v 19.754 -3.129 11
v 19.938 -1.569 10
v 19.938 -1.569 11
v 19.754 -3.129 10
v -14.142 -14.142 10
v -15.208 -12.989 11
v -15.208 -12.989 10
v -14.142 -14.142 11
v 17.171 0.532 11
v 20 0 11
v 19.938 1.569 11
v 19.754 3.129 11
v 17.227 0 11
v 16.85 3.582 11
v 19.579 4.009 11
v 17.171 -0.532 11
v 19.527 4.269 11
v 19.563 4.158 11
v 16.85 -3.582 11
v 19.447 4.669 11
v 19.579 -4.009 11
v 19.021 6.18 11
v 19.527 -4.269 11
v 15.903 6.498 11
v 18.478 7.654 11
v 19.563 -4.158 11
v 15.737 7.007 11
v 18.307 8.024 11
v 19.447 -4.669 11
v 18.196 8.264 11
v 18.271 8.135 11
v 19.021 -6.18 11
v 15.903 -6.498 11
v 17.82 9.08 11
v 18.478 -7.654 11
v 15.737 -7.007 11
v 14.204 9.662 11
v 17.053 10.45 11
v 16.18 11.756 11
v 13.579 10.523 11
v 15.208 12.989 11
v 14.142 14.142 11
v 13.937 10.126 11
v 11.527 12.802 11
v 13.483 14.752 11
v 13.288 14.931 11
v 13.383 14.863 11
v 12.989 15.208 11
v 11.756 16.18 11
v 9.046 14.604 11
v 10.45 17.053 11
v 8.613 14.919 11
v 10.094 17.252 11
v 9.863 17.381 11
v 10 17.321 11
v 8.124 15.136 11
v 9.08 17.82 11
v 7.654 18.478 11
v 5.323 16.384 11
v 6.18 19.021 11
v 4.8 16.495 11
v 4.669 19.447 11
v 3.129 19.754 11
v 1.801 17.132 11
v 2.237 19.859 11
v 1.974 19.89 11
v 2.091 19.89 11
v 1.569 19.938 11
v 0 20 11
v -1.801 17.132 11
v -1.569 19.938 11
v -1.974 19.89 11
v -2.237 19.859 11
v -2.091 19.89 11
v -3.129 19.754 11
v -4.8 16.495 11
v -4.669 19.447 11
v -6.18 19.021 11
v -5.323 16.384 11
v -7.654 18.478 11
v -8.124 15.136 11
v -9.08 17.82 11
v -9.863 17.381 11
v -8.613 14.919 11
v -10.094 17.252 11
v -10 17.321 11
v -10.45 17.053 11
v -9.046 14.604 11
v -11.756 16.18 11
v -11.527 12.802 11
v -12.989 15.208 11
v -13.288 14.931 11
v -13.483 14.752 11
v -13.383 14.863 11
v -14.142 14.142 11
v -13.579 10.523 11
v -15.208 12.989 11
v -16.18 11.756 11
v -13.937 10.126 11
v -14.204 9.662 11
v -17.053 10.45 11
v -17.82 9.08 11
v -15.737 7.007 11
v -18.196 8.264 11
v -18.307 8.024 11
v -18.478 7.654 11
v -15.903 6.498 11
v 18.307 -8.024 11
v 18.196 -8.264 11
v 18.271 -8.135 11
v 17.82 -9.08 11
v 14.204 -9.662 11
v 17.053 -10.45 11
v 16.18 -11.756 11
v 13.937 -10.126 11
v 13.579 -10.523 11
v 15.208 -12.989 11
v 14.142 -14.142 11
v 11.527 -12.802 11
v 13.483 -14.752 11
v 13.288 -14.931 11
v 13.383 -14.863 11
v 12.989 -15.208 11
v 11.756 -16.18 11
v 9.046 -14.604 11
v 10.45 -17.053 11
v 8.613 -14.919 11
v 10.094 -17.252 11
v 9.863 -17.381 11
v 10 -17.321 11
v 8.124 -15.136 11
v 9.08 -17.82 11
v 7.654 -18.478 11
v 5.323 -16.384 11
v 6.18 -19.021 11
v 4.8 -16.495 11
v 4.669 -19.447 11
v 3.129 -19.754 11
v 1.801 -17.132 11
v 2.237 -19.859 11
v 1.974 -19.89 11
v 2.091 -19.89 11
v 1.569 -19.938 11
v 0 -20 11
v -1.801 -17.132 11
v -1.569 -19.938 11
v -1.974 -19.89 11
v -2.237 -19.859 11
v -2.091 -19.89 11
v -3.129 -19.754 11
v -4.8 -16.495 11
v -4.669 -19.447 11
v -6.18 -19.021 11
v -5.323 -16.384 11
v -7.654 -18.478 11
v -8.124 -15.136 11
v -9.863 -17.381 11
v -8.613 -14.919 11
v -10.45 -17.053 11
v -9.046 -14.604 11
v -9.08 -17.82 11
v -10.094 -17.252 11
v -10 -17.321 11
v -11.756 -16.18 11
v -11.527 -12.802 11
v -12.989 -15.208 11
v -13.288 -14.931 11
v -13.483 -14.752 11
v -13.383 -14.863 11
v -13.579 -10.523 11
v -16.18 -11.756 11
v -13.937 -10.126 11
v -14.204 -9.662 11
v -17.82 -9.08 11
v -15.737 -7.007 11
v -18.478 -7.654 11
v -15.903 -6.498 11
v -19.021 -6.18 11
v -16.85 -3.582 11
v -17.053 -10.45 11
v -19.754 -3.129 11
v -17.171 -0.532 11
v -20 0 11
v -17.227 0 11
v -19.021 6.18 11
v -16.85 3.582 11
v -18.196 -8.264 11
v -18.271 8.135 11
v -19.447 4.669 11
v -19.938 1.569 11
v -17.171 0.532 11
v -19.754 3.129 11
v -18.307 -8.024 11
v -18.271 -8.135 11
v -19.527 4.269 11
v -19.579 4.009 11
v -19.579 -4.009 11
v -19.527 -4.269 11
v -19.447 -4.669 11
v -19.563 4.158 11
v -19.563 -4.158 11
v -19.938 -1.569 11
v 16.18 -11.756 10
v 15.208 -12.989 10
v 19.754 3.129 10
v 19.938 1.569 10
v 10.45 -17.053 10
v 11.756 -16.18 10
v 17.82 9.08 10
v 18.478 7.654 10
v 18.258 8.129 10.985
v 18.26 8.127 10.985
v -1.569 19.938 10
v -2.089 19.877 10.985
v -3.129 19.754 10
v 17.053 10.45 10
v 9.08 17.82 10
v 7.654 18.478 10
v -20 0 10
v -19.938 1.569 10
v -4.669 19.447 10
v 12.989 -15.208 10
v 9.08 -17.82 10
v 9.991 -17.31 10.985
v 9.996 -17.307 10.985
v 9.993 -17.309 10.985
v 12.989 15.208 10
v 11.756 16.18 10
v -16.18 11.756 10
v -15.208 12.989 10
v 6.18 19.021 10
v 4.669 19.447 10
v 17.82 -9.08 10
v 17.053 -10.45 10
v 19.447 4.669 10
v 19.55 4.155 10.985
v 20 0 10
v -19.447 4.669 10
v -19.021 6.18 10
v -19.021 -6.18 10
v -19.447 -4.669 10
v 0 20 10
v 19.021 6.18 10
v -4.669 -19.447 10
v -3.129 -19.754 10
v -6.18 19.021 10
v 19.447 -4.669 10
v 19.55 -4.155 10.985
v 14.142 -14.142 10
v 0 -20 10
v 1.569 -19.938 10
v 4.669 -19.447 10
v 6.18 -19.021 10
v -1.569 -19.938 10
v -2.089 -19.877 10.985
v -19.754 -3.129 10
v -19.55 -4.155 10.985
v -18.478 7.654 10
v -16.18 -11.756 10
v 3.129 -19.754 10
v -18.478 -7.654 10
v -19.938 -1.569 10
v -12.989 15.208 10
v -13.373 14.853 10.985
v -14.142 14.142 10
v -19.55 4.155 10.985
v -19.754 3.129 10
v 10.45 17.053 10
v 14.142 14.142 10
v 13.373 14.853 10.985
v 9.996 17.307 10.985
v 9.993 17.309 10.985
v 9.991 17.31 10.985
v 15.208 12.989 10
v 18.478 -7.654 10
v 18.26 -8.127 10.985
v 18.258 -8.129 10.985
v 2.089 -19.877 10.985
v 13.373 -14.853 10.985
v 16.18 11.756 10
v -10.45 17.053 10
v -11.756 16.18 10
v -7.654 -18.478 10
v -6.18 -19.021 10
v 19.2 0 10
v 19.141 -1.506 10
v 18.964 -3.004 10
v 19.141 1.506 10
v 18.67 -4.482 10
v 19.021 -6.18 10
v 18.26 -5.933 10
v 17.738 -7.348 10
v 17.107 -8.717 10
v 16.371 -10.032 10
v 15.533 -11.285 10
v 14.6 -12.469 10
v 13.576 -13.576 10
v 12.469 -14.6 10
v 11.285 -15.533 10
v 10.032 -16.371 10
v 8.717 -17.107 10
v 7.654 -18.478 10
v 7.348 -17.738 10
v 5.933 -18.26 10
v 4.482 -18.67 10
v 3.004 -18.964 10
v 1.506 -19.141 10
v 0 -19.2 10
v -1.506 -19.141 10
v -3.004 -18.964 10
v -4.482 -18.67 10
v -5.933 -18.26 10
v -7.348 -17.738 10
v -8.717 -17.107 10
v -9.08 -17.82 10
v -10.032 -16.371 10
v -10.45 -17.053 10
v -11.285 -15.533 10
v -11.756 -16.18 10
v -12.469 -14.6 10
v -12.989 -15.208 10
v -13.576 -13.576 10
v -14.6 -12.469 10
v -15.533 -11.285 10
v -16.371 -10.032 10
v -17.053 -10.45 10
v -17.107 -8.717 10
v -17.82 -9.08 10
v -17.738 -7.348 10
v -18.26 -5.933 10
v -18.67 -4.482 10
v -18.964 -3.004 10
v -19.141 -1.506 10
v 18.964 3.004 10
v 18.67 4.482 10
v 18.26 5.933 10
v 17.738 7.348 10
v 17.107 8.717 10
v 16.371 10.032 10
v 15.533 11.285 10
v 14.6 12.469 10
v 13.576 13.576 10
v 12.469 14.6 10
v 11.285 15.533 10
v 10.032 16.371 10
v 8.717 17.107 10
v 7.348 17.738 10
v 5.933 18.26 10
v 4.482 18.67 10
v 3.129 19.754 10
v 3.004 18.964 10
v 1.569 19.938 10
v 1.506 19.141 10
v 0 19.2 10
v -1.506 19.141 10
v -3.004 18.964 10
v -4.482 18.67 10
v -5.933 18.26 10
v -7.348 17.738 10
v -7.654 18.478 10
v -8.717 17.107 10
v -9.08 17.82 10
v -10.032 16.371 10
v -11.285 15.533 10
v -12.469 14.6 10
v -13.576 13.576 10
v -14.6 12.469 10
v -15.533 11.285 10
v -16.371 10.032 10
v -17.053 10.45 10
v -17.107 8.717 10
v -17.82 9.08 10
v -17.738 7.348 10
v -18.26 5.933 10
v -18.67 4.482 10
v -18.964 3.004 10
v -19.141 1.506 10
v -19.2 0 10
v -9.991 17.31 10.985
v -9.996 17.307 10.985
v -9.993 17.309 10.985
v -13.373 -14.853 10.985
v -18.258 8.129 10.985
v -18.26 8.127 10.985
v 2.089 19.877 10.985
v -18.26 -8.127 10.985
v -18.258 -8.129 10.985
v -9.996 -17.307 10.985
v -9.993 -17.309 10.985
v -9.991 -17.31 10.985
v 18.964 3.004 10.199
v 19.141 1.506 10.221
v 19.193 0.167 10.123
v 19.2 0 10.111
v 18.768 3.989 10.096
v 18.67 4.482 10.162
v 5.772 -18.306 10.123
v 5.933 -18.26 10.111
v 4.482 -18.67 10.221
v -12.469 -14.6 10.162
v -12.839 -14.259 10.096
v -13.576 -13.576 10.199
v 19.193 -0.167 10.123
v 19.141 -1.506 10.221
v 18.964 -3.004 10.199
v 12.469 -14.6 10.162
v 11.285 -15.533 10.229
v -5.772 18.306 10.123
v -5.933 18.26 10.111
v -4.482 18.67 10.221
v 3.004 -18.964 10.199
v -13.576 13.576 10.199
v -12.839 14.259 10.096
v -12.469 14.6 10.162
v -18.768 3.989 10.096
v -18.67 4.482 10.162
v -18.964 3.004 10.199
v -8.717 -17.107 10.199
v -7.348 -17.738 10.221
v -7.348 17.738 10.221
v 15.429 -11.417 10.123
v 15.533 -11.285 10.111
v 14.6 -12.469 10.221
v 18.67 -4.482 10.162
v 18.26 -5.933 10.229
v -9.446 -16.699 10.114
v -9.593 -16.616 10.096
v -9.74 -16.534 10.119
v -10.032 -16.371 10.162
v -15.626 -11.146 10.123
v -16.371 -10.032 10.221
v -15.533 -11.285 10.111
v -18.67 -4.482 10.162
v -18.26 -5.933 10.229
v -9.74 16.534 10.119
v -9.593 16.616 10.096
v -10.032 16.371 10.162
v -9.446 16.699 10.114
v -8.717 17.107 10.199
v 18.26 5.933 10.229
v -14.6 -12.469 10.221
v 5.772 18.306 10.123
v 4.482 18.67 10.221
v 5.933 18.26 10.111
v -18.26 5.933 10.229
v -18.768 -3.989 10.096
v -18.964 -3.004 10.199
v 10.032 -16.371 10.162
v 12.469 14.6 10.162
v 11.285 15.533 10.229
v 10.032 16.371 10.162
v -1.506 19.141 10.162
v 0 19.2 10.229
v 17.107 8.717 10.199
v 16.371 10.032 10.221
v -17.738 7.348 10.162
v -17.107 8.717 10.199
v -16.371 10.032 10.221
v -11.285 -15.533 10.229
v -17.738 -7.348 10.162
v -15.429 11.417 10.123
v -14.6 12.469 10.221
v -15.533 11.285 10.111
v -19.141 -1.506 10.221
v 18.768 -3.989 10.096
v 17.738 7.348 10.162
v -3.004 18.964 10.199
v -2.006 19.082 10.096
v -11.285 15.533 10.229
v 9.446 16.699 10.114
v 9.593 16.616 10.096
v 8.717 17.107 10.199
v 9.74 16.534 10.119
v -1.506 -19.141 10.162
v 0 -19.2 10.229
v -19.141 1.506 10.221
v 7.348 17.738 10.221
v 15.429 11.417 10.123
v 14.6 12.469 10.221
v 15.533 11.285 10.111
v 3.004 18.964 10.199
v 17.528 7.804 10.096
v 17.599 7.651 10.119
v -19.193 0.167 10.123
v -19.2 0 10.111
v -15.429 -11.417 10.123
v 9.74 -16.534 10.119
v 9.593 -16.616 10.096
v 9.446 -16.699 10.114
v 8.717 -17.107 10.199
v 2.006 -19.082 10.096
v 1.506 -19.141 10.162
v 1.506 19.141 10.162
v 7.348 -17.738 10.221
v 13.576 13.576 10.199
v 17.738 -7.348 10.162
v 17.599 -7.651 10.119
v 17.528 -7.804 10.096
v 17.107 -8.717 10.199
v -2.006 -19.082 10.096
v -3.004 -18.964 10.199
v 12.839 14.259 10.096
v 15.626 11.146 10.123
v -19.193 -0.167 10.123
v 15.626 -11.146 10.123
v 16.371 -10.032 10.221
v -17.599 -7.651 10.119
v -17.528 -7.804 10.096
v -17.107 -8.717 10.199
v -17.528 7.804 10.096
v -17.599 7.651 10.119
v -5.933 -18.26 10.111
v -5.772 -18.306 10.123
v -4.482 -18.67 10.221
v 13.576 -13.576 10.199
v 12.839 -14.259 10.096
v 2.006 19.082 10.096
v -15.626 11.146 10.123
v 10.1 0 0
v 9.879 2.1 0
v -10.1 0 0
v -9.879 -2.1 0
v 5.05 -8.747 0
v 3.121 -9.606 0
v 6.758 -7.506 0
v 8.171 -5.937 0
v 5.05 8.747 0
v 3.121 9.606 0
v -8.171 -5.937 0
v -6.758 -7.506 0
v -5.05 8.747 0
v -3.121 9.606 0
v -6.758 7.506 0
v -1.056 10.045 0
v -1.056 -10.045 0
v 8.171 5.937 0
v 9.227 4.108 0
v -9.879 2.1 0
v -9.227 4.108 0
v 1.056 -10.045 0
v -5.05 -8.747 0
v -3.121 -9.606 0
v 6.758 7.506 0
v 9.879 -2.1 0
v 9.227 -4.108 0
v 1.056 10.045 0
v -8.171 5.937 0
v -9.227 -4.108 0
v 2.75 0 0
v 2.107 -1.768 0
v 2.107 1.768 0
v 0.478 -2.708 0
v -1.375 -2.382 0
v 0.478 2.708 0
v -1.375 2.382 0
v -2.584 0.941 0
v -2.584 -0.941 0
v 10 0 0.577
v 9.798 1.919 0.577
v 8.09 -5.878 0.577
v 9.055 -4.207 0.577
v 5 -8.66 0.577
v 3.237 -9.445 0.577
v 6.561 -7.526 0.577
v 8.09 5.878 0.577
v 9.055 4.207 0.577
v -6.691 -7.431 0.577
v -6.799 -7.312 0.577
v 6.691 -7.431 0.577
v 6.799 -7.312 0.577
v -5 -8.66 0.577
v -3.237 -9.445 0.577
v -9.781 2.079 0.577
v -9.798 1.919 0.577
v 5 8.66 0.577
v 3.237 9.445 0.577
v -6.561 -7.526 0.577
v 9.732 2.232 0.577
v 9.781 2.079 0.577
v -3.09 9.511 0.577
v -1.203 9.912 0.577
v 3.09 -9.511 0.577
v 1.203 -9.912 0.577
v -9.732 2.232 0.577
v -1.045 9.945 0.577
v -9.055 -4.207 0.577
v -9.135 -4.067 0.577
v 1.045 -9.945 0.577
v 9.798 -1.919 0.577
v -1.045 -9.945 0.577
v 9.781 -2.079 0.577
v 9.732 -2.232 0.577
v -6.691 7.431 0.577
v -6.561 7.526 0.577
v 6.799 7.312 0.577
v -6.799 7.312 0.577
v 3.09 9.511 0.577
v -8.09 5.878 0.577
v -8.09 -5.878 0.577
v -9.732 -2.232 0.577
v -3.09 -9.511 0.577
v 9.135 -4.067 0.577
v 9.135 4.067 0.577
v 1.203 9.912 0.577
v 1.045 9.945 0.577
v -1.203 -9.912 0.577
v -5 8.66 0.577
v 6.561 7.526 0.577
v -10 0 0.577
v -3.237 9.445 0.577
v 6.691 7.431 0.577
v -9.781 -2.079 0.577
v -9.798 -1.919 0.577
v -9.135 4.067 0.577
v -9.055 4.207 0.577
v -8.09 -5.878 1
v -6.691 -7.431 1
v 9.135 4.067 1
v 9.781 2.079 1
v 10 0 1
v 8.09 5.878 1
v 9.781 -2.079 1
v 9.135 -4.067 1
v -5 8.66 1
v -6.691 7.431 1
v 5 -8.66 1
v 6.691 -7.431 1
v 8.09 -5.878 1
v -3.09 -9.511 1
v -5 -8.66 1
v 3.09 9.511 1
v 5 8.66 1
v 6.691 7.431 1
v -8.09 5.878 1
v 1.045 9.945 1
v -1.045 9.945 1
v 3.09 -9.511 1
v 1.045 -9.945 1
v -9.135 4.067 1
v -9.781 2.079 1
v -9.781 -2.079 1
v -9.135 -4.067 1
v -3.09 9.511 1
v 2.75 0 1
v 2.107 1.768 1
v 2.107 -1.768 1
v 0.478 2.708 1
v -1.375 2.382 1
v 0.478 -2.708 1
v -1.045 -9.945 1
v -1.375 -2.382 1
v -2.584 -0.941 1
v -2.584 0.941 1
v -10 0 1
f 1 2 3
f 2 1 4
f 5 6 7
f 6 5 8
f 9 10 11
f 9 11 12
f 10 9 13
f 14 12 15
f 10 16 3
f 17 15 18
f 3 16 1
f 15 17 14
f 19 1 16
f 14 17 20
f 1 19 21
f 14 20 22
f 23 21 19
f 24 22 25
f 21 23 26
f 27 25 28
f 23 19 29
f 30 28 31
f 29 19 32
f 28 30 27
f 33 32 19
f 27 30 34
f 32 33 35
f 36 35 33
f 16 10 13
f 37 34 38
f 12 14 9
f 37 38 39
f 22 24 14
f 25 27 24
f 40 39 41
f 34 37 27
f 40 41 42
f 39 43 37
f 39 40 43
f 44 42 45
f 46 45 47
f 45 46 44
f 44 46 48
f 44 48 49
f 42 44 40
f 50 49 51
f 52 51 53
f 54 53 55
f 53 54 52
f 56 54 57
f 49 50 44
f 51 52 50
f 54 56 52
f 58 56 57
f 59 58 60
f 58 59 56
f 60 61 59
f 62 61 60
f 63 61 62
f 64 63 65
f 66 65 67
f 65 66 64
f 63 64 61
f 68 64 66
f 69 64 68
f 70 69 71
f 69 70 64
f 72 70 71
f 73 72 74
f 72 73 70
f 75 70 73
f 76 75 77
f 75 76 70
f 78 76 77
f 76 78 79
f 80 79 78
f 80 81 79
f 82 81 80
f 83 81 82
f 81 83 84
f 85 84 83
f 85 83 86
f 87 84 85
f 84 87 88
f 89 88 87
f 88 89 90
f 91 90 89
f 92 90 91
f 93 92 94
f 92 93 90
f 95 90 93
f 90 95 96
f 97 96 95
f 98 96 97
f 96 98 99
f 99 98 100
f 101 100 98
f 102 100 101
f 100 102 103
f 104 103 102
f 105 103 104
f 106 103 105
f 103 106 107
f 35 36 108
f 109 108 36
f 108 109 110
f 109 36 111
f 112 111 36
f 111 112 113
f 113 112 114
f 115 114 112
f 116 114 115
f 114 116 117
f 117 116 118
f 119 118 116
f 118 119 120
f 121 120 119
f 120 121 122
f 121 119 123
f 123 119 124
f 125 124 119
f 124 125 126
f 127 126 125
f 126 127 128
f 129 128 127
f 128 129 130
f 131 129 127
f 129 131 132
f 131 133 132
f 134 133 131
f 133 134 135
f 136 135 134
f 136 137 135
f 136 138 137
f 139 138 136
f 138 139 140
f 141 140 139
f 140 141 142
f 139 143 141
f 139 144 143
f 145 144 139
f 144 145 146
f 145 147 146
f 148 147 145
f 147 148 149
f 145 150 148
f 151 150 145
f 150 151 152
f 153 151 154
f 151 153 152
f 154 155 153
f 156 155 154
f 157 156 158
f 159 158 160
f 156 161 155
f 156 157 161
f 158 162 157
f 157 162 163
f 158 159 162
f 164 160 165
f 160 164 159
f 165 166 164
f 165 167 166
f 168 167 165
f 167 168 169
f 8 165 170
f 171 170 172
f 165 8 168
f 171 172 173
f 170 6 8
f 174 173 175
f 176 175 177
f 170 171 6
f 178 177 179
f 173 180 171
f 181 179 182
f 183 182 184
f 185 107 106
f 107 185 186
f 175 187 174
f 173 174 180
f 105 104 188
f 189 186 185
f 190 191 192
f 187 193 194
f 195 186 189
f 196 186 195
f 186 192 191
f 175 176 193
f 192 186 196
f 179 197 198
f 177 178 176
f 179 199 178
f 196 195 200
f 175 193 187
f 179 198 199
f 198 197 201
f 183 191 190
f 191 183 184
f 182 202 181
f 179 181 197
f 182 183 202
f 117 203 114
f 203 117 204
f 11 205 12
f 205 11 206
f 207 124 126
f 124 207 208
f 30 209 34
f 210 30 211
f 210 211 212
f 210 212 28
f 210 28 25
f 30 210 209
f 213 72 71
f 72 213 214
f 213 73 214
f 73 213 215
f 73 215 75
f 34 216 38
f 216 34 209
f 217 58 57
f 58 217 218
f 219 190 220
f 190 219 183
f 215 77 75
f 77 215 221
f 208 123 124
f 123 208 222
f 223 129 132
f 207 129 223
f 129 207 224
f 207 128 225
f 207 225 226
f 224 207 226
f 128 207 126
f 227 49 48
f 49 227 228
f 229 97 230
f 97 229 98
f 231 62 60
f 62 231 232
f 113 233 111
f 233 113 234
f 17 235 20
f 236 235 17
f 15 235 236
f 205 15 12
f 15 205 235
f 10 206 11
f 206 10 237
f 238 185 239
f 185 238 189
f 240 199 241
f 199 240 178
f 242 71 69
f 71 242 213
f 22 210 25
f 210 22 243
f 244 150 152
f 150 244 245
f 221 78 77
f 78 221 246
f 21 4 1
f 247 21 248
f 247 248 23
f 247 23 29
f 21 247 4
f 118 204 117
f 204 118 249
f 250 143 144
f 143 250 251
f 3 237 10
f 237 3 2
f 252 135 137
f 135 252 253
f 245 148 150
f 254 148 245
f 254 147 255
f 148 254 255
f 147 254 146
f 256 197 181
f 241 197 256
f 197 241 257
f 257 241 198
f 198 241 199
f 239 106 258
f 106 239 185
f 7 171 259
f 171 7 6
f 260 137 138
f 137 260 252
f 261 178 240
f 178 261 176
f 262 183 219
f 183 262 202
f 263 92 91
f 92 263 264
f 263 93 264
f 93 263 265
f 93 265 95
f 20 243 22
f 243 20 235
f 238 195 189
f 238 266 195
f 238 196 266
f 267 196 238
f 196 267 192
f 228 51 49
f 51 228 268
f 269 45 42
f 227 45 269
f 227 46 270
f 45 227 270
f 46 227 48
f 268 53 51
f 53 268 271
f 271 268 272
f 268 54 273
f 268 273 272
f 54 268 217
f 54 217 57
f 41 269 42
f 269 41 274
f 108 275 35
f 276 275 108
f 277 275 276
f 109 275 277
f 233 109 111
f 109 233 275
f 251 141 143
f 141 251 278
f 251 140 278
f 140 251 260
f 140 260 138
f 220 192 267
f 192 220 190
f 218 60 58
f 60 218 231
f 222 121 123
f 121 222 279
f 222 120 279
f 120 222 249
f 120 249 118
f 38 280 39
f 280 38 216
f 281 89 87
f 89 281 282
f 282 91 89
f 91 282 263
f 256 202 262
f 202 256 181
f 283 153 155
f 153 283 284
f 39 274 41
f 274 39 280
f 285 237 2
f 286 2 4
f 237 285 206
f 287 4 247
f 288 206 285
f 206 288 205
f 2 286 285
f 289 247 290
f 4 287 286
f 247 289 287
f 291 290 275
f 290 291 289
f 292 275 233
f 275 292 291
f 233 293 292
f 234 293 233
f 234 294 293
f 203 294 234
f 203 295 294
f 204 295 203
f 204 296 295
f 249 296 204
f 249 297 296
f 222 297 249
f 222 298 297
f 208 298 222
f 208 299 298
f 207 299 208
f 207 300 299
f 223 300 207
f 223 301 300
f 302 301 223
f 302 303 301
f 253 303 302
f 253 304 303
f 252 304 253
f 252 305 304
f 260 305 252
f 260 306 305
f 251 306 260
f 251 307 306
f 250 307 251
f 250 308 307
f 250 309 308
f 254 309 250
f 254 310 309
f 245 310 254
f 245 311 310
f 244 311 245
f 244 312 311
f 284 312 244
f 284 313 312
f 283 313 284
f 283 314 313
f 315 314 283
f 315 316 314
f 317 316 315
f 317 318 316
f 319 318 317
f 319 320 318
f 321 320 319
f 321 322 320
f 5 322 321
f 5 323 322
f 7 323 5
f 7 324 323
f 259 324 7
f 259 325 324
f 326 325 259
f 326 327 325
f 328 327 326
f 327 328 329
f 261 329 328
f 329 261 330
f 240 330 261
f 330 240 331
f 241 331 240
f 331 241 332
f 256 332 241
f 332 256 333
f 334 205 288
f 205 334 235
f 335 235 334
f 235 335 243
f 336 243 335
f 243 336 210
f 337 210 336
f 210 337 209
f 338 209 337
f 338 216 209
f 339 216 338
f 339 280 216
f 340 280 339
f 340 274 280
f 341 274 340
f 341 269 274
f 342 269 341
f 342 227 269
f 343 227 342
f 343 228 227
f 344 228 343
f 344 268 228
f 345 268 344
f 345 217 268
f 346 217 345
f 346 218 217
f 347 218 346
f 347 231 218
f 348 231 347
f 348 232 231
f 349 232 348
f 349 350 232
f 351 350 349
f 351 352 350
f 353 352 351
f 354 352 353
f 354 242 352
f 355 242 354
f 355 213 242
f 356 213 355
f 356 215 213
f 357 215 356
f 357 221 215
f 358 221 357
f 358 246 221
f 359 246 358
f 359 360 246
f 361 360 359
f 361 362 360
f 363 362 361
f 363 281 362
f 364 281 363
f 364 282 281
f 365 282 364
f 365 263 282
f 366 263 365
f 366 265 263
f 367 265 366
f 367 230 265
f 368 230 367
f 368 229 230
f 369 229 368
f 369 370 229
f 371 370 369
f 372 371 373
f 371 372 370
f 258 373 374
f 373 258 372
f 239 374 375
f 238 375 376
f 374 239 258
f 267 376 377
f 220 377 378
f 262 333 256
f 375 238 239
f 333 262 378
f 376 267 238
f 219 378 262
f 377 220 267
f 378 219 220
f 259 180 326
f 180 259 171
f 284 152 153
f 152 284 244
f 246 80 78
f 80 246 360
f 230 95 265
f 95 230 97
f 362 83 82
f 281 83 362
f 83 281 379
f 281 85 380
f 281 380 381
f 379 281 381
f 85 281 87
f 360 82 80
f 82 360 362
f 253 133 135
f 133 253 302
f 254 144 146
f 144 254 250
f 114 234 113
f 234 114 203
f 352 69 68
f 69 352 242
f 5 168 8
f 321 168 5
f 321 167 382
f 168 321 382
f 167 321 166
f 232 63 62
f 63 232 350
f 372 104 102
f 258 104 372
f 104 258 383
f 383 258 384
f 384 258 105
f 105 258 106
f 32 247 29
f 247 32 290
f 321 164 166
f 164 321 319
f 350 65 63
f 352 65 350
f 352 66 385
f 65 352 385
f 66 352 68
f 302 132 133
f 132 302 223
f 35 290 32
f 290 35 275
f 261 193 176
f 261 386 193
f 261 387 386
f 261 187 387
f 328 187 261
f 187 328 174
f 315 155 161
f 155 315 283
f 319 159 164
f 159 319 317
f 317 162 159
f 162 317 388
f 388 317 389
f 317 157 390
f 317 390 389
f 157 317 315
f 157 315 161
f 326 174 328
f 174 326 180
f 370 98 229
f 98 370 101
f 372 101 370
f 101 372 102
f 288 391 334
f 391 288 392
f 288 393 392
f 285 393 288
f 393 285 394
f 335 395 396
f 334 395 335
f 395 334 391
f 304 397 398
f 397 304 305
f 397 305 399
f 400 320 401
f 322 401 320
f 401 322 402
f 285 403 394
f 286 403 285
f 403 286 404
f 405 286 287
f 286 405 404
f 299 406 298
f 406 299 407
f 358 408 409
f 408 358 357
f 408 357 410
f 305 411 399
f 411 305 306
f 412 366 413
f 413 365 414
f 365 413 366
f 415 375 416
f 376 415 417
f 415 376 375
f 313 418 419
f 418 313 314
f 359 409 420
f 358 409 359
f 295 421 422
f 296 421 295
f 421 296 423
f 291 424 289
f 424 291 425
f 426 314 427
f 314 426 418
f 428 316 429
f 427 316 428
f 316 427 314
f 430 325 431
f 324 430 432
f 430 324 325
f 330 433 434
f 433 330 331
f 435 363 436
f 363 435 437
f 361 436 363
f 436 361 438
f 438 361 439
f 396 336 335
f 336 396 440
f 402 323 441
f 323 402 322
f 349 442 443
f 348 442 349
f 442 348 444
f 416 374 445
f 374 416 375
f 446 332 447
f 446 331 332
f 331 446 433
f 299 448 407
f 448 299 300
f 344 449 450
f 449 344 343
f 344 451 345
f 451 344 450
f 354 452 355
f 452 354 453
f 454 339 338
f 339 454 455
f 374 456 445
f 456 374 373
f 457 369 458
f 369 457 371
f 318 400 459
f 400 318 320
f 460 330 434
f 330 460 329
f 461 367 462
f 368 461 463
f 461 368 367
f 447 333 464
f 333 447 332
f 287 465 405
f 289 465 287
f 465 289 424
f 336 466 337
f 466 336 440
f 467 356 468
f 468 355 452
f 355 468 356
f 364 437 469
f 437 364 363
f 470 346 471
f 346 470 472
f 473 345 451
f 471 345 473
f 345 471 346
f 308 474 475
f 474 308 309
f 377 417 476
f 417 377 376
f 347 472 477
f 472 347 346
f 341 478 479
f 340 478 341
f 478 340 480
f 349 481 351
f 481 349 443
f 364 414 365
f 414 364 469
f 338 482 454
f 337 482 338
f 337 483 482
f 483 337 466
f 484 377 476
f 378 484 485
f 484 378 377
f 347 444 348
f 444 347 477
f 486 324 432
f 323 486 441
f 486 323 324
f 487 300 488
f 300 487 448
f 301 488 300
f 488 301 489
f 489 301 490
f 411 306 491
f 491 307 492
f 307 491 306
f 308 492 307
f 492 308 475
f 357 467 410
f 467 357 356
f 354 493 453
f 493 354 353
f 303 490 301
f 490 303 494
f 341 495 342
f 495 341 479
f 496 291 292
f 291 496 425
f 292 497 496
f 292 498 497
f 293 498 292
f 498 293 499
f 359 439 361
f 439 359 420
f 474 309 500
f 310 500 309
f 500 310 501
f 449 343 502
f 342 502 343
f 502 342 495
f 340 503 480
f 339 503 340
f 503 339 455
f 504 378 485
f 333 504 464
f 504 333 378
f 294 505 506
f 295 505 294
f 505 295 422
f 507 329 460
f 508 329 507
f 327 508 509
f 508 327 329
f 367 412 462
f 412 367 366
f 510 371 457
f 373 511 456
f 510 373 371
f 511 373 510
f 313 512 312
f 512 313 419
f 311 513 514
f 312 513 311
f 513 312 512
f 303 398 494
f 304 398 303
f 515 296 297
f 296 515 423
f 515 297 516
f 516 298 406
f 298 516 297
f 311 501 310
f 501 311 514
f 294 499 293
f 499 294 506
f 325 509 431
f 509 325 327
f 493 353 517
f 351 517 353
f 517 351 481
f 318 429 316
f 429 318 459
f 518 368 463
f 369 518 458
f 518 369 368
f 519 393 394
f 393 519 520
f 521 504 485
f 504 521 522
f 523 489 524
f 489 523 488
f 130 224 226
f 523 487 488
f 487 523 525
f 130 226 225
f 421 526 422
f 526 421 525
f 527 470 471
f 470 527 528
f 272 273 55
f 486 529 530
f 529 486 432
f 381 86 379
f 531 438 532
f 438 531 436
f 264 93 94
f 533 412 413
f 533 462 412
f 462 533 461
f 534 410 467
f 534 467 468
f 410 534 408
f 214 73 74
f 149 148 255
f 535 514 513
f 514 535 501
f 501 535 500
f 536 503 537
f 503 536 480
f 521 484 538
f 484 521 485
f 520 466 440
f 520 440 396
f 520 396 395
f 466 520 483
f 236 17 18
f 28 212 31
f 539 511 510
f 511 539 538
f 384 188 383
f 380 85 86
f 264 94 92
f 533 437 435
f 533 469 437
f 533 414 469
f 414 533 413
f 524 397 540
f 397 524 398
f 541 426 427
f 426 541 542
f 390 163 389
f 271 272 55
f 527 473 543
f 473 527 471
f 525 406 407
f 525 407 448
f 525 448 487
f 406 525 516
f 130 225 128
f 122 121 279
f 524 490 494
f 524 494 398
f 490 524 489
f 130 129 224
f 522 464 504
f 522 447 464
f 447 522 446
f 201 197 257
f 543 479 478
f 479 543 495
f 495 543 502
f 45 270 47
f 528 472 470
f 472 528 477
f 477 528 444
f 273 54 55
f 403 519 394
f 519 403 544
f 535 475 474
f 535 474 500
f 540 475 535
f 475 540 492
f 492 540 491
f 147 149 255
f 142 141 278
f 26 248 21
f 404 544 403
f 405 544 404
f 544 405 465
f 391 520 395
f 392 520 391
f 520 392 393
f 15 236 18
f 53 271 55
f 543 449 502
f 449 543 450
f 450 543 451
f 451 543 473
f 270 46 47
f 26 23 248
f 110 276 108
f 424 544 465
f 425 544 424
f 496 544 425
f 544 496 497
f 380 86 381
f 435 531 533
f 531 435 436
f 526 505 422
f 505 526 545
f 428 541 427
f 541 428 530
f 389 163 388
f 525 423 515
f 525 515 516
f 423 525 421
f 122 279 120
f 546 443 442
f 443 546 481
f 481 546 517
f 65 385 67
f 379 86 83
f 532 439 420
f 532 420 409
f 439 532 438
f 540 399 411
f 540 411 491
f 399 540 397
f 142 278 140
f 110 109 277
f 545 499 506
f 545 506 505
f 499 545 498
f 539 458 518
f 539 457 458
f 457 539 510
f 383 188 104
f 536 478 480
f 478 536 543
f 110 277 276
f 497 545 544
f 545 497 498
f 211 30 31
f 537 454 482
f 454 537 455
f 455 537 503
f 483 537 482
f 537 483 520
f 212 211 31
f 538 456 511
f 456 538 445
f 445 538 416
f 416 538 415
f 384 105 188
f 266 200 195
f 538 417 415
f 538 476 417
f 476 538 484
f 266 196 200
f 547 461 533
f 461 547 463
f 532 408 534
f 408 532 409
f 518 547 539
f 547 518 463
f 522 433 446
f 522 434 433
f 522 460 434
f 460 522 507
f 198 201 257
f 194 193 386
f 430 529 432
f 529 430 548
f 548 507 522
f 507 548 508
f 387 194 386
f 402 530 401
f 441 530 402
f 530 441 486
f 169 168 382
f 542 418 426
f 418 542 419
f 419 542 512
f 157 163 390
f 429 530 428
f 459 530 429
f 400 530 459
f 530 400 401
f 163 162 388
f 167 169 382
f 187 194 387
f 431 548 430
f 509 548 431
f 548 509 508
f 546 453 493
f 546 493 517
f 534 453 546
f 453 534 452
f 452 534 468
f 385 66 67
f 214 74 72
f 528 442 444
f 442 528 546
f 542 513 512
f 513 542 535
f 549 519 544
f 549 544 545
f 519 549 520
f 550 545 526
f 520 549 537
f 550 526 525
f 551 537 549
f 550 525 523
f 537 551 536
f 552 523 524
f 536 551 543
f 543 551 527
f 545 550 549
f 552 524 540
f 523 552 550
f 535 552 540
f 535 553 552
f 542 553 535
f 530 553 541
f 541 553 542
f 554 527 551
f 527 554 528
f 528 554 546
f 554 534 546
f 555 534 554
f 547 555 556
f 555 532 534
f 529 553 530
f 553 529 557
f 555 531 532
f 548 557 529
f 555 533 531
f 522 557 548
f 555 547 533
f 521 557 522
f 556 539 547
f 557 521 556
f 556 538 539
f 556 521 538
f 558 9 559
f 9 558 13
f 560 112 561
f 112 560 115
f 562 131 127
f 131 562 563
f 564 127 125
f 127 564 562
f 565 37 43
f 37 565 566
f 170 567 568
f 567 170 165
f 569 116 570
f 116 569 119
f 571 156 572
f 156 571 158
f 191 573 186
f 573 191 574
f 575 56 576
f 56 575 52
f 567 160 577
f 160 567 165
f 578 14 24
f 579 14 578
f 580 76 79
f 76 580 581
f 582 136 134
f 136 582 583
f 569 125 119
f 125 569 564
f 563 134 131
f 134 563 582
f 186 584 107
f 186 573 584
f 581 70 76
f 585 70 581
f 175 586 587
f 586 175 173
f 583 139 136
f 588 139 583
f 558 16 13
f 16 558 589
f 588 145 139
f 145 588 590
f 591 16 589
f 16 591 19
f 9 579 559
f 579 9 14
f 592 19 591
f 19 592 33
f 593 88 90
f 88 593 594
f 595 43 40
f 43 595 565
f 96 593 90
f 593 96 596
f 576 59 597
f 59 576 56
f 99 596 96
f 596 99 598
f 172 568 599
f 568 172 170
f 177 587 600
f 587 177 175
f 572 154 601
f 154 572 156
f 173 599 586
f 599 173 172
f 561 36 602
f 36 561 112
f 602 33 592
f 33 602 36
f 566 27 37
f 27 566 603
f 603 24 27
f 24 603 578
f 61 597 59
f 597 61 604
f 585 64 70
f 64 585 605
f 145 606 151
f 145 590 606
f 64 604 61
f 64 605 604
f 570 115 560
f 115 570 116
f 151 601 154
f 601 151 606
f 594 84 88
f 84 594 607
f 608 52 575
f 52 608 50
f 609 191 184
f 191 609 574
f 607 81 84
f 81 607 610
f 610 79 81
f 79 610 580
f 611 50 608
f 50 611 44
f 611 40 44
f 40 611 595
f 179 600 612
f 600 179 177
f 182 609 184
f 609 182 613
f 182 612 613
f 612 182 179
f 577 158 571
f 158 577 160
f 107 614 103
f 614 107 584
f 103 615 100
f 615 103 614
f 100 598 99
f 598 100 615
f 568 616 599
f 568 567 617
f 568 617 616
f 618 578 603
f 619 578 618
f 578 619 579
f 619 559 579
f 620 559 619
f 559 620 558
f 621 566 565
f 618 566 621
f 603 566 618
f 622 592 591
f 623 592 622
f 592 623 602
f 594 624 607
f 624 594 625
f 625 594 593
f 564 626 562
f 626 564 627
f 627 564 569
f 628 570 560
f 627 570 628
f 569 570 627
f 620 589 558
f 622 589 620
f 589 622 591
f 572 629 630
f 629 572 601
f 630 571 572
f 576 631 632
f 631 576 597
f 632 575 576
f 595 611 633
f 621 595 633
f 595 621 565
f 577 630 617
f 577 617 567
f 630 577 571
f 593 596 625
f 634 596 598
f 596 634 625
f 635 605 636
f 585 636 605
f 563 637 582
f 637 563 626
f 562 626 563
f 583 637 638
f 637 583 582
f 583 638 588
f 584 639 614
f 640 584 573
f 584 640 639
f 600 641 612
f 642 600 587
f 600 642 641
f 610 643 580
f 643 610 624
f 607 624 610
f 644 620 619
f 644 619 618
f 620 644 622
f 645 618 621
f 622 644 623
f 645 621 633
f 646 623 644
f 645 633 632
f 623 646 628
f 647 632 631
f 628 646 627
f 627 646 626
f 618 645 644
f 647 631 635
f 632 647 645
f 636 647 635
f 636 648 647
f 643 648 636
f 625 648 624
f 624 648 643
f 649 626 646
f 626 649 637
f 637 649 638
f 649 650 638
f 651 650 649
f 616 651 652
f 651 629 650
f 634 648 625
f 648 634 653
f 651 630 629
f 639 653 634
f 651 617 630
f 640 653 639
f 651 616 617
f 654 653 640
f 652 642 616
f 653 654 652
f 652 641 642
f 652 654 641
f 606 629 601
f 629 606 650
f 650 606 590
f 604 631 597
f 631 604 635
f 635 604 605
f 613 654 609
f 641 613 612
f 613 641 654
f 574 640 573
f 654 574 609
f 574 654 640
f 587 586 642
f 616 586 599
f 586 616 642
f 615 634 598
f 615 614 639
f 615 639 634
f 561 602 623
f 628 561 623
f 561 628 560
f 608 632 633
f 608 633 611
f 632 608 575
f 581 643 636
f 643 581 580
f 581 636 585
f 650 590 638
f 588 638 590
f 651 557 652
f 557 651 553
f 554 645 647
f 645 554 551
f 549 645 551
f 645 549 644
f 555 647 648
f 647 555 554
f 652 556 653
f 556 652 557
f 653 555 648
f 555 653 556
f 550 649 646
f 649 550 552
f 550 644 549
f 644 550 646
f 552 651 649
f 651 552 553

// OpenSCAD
// file: variables.scad
// General

resolution = 80;
delta = 0.2;

// dimensions tubes pvc

rayon_ext_tube_32 = 16;
rayon_int_tube_32 = 13;
epaisseur_tube_32 = rayon_ext_tube_32 - rayon_int_tube_32;

rayon_ext_tube_40 = 20;
rayon_int_tube_40 = 17.5;
epaisseur_tube_40 = rayon_ext_tube_40 - rayon_int_tube_40;

ret32 = rayon_ext_tube_32;
rit32 = rayon_int_tube_32;
ep32  = epaisseur_tube_32;
ret40 = rayon_ext_tube_40;
rit40 = rayon_int_tube_40;
ep40  = epaisseur_tube_40;

// Reducteur

epaisseur_reducteur = 4;

// L'embout accueille un tube pvc de 40mm de diamètre.

hauteur_embout = 20;
rayon_int_embout = rayon_ext_tube_40 + delta;
rayon_ext_embout = 24 + delta;

hauteur_butee = 2;
rayon_int_butee = 16;

// Jonction: section de contact entre les deux pièces.
hauteur_grower = 8;

rayon_ext_culot = rayon_ext_tube_40 - delta;
rayon_int_culot = 18 - delta;
hauteur_jonction = 30;

hauteur_totale = hauteur_jonction + hauteur_embout + hauteur_butee + hauteur_grower;

profondeur_douille = 12;

largeur_empreinte = 6;

position_z_empreinte = hauteur_totale - profondeur_douille + 1;

nb_baionette = 3;
rayon_baionette = largeur_empreinte / 2;
baionette_z = hauteur_totale - (hauteur_jonction - profondeur_douille);
// file: common.scad
module tube(hauteur, rayon_exterieur, rayon_interieur, resolution=resolution) {
	difference(){
	  cylinder(hauteur, rayon_exterieur, rayon_exterieur, $fn=resolution);
	  translate([0,0,-1])	
	 	  cylinder(hauteur + 2 , rayon_interieur, rayon_interieur, $fn=resolution);
	}
}

module donut(rayon_spheres, rayon_exterieur){
	rotate_extrude(convexity = 10, $fn = resolution)
		translate([rayon_exterieur,0,0])
		circle(r = rayon_spheres, $fn = resolution);
}
// main file
include <common.scad>;
include <variables.scad>;

rayon_led = 2.75;
diam_fixation = 3;

ecart_entre_leds = 10;
ecart_entre_fixations = 11;

translate([0,0,10])
	tube(1, rayon_int_embout-delta, rayon_int_embout-1);

difference(){	
	cylinder(r1=rayon_int_embout/2, r2=rayon_int_embout-delta, h=11);
		cylinder(r1=(rayon_int_embout-1)/2, r2=rayon_int_embout-delta, h=15);
}

difference(){
	cylinder(r=10, h=1);

	// trous pour leds
	translate([0,0,-2]){
		cylinder(r=rayon_led, h=4);
	}

	// translate([-ecart_entre_leds/2,0,-1]){
	// 	cylinder(r=rayon_led, h=4);
	// }

	// // trous pour fixations
	// translate([1,-ecart_entre_fixations/2,-1]){
	// 	cylinder(r=diam_fixation/2, h=4);
	// }

	// translate([1,ecart_entre_fixations/2,-1]){
	// 	cylinder(r=diam_fixation/2, h=4);
	// }

}
